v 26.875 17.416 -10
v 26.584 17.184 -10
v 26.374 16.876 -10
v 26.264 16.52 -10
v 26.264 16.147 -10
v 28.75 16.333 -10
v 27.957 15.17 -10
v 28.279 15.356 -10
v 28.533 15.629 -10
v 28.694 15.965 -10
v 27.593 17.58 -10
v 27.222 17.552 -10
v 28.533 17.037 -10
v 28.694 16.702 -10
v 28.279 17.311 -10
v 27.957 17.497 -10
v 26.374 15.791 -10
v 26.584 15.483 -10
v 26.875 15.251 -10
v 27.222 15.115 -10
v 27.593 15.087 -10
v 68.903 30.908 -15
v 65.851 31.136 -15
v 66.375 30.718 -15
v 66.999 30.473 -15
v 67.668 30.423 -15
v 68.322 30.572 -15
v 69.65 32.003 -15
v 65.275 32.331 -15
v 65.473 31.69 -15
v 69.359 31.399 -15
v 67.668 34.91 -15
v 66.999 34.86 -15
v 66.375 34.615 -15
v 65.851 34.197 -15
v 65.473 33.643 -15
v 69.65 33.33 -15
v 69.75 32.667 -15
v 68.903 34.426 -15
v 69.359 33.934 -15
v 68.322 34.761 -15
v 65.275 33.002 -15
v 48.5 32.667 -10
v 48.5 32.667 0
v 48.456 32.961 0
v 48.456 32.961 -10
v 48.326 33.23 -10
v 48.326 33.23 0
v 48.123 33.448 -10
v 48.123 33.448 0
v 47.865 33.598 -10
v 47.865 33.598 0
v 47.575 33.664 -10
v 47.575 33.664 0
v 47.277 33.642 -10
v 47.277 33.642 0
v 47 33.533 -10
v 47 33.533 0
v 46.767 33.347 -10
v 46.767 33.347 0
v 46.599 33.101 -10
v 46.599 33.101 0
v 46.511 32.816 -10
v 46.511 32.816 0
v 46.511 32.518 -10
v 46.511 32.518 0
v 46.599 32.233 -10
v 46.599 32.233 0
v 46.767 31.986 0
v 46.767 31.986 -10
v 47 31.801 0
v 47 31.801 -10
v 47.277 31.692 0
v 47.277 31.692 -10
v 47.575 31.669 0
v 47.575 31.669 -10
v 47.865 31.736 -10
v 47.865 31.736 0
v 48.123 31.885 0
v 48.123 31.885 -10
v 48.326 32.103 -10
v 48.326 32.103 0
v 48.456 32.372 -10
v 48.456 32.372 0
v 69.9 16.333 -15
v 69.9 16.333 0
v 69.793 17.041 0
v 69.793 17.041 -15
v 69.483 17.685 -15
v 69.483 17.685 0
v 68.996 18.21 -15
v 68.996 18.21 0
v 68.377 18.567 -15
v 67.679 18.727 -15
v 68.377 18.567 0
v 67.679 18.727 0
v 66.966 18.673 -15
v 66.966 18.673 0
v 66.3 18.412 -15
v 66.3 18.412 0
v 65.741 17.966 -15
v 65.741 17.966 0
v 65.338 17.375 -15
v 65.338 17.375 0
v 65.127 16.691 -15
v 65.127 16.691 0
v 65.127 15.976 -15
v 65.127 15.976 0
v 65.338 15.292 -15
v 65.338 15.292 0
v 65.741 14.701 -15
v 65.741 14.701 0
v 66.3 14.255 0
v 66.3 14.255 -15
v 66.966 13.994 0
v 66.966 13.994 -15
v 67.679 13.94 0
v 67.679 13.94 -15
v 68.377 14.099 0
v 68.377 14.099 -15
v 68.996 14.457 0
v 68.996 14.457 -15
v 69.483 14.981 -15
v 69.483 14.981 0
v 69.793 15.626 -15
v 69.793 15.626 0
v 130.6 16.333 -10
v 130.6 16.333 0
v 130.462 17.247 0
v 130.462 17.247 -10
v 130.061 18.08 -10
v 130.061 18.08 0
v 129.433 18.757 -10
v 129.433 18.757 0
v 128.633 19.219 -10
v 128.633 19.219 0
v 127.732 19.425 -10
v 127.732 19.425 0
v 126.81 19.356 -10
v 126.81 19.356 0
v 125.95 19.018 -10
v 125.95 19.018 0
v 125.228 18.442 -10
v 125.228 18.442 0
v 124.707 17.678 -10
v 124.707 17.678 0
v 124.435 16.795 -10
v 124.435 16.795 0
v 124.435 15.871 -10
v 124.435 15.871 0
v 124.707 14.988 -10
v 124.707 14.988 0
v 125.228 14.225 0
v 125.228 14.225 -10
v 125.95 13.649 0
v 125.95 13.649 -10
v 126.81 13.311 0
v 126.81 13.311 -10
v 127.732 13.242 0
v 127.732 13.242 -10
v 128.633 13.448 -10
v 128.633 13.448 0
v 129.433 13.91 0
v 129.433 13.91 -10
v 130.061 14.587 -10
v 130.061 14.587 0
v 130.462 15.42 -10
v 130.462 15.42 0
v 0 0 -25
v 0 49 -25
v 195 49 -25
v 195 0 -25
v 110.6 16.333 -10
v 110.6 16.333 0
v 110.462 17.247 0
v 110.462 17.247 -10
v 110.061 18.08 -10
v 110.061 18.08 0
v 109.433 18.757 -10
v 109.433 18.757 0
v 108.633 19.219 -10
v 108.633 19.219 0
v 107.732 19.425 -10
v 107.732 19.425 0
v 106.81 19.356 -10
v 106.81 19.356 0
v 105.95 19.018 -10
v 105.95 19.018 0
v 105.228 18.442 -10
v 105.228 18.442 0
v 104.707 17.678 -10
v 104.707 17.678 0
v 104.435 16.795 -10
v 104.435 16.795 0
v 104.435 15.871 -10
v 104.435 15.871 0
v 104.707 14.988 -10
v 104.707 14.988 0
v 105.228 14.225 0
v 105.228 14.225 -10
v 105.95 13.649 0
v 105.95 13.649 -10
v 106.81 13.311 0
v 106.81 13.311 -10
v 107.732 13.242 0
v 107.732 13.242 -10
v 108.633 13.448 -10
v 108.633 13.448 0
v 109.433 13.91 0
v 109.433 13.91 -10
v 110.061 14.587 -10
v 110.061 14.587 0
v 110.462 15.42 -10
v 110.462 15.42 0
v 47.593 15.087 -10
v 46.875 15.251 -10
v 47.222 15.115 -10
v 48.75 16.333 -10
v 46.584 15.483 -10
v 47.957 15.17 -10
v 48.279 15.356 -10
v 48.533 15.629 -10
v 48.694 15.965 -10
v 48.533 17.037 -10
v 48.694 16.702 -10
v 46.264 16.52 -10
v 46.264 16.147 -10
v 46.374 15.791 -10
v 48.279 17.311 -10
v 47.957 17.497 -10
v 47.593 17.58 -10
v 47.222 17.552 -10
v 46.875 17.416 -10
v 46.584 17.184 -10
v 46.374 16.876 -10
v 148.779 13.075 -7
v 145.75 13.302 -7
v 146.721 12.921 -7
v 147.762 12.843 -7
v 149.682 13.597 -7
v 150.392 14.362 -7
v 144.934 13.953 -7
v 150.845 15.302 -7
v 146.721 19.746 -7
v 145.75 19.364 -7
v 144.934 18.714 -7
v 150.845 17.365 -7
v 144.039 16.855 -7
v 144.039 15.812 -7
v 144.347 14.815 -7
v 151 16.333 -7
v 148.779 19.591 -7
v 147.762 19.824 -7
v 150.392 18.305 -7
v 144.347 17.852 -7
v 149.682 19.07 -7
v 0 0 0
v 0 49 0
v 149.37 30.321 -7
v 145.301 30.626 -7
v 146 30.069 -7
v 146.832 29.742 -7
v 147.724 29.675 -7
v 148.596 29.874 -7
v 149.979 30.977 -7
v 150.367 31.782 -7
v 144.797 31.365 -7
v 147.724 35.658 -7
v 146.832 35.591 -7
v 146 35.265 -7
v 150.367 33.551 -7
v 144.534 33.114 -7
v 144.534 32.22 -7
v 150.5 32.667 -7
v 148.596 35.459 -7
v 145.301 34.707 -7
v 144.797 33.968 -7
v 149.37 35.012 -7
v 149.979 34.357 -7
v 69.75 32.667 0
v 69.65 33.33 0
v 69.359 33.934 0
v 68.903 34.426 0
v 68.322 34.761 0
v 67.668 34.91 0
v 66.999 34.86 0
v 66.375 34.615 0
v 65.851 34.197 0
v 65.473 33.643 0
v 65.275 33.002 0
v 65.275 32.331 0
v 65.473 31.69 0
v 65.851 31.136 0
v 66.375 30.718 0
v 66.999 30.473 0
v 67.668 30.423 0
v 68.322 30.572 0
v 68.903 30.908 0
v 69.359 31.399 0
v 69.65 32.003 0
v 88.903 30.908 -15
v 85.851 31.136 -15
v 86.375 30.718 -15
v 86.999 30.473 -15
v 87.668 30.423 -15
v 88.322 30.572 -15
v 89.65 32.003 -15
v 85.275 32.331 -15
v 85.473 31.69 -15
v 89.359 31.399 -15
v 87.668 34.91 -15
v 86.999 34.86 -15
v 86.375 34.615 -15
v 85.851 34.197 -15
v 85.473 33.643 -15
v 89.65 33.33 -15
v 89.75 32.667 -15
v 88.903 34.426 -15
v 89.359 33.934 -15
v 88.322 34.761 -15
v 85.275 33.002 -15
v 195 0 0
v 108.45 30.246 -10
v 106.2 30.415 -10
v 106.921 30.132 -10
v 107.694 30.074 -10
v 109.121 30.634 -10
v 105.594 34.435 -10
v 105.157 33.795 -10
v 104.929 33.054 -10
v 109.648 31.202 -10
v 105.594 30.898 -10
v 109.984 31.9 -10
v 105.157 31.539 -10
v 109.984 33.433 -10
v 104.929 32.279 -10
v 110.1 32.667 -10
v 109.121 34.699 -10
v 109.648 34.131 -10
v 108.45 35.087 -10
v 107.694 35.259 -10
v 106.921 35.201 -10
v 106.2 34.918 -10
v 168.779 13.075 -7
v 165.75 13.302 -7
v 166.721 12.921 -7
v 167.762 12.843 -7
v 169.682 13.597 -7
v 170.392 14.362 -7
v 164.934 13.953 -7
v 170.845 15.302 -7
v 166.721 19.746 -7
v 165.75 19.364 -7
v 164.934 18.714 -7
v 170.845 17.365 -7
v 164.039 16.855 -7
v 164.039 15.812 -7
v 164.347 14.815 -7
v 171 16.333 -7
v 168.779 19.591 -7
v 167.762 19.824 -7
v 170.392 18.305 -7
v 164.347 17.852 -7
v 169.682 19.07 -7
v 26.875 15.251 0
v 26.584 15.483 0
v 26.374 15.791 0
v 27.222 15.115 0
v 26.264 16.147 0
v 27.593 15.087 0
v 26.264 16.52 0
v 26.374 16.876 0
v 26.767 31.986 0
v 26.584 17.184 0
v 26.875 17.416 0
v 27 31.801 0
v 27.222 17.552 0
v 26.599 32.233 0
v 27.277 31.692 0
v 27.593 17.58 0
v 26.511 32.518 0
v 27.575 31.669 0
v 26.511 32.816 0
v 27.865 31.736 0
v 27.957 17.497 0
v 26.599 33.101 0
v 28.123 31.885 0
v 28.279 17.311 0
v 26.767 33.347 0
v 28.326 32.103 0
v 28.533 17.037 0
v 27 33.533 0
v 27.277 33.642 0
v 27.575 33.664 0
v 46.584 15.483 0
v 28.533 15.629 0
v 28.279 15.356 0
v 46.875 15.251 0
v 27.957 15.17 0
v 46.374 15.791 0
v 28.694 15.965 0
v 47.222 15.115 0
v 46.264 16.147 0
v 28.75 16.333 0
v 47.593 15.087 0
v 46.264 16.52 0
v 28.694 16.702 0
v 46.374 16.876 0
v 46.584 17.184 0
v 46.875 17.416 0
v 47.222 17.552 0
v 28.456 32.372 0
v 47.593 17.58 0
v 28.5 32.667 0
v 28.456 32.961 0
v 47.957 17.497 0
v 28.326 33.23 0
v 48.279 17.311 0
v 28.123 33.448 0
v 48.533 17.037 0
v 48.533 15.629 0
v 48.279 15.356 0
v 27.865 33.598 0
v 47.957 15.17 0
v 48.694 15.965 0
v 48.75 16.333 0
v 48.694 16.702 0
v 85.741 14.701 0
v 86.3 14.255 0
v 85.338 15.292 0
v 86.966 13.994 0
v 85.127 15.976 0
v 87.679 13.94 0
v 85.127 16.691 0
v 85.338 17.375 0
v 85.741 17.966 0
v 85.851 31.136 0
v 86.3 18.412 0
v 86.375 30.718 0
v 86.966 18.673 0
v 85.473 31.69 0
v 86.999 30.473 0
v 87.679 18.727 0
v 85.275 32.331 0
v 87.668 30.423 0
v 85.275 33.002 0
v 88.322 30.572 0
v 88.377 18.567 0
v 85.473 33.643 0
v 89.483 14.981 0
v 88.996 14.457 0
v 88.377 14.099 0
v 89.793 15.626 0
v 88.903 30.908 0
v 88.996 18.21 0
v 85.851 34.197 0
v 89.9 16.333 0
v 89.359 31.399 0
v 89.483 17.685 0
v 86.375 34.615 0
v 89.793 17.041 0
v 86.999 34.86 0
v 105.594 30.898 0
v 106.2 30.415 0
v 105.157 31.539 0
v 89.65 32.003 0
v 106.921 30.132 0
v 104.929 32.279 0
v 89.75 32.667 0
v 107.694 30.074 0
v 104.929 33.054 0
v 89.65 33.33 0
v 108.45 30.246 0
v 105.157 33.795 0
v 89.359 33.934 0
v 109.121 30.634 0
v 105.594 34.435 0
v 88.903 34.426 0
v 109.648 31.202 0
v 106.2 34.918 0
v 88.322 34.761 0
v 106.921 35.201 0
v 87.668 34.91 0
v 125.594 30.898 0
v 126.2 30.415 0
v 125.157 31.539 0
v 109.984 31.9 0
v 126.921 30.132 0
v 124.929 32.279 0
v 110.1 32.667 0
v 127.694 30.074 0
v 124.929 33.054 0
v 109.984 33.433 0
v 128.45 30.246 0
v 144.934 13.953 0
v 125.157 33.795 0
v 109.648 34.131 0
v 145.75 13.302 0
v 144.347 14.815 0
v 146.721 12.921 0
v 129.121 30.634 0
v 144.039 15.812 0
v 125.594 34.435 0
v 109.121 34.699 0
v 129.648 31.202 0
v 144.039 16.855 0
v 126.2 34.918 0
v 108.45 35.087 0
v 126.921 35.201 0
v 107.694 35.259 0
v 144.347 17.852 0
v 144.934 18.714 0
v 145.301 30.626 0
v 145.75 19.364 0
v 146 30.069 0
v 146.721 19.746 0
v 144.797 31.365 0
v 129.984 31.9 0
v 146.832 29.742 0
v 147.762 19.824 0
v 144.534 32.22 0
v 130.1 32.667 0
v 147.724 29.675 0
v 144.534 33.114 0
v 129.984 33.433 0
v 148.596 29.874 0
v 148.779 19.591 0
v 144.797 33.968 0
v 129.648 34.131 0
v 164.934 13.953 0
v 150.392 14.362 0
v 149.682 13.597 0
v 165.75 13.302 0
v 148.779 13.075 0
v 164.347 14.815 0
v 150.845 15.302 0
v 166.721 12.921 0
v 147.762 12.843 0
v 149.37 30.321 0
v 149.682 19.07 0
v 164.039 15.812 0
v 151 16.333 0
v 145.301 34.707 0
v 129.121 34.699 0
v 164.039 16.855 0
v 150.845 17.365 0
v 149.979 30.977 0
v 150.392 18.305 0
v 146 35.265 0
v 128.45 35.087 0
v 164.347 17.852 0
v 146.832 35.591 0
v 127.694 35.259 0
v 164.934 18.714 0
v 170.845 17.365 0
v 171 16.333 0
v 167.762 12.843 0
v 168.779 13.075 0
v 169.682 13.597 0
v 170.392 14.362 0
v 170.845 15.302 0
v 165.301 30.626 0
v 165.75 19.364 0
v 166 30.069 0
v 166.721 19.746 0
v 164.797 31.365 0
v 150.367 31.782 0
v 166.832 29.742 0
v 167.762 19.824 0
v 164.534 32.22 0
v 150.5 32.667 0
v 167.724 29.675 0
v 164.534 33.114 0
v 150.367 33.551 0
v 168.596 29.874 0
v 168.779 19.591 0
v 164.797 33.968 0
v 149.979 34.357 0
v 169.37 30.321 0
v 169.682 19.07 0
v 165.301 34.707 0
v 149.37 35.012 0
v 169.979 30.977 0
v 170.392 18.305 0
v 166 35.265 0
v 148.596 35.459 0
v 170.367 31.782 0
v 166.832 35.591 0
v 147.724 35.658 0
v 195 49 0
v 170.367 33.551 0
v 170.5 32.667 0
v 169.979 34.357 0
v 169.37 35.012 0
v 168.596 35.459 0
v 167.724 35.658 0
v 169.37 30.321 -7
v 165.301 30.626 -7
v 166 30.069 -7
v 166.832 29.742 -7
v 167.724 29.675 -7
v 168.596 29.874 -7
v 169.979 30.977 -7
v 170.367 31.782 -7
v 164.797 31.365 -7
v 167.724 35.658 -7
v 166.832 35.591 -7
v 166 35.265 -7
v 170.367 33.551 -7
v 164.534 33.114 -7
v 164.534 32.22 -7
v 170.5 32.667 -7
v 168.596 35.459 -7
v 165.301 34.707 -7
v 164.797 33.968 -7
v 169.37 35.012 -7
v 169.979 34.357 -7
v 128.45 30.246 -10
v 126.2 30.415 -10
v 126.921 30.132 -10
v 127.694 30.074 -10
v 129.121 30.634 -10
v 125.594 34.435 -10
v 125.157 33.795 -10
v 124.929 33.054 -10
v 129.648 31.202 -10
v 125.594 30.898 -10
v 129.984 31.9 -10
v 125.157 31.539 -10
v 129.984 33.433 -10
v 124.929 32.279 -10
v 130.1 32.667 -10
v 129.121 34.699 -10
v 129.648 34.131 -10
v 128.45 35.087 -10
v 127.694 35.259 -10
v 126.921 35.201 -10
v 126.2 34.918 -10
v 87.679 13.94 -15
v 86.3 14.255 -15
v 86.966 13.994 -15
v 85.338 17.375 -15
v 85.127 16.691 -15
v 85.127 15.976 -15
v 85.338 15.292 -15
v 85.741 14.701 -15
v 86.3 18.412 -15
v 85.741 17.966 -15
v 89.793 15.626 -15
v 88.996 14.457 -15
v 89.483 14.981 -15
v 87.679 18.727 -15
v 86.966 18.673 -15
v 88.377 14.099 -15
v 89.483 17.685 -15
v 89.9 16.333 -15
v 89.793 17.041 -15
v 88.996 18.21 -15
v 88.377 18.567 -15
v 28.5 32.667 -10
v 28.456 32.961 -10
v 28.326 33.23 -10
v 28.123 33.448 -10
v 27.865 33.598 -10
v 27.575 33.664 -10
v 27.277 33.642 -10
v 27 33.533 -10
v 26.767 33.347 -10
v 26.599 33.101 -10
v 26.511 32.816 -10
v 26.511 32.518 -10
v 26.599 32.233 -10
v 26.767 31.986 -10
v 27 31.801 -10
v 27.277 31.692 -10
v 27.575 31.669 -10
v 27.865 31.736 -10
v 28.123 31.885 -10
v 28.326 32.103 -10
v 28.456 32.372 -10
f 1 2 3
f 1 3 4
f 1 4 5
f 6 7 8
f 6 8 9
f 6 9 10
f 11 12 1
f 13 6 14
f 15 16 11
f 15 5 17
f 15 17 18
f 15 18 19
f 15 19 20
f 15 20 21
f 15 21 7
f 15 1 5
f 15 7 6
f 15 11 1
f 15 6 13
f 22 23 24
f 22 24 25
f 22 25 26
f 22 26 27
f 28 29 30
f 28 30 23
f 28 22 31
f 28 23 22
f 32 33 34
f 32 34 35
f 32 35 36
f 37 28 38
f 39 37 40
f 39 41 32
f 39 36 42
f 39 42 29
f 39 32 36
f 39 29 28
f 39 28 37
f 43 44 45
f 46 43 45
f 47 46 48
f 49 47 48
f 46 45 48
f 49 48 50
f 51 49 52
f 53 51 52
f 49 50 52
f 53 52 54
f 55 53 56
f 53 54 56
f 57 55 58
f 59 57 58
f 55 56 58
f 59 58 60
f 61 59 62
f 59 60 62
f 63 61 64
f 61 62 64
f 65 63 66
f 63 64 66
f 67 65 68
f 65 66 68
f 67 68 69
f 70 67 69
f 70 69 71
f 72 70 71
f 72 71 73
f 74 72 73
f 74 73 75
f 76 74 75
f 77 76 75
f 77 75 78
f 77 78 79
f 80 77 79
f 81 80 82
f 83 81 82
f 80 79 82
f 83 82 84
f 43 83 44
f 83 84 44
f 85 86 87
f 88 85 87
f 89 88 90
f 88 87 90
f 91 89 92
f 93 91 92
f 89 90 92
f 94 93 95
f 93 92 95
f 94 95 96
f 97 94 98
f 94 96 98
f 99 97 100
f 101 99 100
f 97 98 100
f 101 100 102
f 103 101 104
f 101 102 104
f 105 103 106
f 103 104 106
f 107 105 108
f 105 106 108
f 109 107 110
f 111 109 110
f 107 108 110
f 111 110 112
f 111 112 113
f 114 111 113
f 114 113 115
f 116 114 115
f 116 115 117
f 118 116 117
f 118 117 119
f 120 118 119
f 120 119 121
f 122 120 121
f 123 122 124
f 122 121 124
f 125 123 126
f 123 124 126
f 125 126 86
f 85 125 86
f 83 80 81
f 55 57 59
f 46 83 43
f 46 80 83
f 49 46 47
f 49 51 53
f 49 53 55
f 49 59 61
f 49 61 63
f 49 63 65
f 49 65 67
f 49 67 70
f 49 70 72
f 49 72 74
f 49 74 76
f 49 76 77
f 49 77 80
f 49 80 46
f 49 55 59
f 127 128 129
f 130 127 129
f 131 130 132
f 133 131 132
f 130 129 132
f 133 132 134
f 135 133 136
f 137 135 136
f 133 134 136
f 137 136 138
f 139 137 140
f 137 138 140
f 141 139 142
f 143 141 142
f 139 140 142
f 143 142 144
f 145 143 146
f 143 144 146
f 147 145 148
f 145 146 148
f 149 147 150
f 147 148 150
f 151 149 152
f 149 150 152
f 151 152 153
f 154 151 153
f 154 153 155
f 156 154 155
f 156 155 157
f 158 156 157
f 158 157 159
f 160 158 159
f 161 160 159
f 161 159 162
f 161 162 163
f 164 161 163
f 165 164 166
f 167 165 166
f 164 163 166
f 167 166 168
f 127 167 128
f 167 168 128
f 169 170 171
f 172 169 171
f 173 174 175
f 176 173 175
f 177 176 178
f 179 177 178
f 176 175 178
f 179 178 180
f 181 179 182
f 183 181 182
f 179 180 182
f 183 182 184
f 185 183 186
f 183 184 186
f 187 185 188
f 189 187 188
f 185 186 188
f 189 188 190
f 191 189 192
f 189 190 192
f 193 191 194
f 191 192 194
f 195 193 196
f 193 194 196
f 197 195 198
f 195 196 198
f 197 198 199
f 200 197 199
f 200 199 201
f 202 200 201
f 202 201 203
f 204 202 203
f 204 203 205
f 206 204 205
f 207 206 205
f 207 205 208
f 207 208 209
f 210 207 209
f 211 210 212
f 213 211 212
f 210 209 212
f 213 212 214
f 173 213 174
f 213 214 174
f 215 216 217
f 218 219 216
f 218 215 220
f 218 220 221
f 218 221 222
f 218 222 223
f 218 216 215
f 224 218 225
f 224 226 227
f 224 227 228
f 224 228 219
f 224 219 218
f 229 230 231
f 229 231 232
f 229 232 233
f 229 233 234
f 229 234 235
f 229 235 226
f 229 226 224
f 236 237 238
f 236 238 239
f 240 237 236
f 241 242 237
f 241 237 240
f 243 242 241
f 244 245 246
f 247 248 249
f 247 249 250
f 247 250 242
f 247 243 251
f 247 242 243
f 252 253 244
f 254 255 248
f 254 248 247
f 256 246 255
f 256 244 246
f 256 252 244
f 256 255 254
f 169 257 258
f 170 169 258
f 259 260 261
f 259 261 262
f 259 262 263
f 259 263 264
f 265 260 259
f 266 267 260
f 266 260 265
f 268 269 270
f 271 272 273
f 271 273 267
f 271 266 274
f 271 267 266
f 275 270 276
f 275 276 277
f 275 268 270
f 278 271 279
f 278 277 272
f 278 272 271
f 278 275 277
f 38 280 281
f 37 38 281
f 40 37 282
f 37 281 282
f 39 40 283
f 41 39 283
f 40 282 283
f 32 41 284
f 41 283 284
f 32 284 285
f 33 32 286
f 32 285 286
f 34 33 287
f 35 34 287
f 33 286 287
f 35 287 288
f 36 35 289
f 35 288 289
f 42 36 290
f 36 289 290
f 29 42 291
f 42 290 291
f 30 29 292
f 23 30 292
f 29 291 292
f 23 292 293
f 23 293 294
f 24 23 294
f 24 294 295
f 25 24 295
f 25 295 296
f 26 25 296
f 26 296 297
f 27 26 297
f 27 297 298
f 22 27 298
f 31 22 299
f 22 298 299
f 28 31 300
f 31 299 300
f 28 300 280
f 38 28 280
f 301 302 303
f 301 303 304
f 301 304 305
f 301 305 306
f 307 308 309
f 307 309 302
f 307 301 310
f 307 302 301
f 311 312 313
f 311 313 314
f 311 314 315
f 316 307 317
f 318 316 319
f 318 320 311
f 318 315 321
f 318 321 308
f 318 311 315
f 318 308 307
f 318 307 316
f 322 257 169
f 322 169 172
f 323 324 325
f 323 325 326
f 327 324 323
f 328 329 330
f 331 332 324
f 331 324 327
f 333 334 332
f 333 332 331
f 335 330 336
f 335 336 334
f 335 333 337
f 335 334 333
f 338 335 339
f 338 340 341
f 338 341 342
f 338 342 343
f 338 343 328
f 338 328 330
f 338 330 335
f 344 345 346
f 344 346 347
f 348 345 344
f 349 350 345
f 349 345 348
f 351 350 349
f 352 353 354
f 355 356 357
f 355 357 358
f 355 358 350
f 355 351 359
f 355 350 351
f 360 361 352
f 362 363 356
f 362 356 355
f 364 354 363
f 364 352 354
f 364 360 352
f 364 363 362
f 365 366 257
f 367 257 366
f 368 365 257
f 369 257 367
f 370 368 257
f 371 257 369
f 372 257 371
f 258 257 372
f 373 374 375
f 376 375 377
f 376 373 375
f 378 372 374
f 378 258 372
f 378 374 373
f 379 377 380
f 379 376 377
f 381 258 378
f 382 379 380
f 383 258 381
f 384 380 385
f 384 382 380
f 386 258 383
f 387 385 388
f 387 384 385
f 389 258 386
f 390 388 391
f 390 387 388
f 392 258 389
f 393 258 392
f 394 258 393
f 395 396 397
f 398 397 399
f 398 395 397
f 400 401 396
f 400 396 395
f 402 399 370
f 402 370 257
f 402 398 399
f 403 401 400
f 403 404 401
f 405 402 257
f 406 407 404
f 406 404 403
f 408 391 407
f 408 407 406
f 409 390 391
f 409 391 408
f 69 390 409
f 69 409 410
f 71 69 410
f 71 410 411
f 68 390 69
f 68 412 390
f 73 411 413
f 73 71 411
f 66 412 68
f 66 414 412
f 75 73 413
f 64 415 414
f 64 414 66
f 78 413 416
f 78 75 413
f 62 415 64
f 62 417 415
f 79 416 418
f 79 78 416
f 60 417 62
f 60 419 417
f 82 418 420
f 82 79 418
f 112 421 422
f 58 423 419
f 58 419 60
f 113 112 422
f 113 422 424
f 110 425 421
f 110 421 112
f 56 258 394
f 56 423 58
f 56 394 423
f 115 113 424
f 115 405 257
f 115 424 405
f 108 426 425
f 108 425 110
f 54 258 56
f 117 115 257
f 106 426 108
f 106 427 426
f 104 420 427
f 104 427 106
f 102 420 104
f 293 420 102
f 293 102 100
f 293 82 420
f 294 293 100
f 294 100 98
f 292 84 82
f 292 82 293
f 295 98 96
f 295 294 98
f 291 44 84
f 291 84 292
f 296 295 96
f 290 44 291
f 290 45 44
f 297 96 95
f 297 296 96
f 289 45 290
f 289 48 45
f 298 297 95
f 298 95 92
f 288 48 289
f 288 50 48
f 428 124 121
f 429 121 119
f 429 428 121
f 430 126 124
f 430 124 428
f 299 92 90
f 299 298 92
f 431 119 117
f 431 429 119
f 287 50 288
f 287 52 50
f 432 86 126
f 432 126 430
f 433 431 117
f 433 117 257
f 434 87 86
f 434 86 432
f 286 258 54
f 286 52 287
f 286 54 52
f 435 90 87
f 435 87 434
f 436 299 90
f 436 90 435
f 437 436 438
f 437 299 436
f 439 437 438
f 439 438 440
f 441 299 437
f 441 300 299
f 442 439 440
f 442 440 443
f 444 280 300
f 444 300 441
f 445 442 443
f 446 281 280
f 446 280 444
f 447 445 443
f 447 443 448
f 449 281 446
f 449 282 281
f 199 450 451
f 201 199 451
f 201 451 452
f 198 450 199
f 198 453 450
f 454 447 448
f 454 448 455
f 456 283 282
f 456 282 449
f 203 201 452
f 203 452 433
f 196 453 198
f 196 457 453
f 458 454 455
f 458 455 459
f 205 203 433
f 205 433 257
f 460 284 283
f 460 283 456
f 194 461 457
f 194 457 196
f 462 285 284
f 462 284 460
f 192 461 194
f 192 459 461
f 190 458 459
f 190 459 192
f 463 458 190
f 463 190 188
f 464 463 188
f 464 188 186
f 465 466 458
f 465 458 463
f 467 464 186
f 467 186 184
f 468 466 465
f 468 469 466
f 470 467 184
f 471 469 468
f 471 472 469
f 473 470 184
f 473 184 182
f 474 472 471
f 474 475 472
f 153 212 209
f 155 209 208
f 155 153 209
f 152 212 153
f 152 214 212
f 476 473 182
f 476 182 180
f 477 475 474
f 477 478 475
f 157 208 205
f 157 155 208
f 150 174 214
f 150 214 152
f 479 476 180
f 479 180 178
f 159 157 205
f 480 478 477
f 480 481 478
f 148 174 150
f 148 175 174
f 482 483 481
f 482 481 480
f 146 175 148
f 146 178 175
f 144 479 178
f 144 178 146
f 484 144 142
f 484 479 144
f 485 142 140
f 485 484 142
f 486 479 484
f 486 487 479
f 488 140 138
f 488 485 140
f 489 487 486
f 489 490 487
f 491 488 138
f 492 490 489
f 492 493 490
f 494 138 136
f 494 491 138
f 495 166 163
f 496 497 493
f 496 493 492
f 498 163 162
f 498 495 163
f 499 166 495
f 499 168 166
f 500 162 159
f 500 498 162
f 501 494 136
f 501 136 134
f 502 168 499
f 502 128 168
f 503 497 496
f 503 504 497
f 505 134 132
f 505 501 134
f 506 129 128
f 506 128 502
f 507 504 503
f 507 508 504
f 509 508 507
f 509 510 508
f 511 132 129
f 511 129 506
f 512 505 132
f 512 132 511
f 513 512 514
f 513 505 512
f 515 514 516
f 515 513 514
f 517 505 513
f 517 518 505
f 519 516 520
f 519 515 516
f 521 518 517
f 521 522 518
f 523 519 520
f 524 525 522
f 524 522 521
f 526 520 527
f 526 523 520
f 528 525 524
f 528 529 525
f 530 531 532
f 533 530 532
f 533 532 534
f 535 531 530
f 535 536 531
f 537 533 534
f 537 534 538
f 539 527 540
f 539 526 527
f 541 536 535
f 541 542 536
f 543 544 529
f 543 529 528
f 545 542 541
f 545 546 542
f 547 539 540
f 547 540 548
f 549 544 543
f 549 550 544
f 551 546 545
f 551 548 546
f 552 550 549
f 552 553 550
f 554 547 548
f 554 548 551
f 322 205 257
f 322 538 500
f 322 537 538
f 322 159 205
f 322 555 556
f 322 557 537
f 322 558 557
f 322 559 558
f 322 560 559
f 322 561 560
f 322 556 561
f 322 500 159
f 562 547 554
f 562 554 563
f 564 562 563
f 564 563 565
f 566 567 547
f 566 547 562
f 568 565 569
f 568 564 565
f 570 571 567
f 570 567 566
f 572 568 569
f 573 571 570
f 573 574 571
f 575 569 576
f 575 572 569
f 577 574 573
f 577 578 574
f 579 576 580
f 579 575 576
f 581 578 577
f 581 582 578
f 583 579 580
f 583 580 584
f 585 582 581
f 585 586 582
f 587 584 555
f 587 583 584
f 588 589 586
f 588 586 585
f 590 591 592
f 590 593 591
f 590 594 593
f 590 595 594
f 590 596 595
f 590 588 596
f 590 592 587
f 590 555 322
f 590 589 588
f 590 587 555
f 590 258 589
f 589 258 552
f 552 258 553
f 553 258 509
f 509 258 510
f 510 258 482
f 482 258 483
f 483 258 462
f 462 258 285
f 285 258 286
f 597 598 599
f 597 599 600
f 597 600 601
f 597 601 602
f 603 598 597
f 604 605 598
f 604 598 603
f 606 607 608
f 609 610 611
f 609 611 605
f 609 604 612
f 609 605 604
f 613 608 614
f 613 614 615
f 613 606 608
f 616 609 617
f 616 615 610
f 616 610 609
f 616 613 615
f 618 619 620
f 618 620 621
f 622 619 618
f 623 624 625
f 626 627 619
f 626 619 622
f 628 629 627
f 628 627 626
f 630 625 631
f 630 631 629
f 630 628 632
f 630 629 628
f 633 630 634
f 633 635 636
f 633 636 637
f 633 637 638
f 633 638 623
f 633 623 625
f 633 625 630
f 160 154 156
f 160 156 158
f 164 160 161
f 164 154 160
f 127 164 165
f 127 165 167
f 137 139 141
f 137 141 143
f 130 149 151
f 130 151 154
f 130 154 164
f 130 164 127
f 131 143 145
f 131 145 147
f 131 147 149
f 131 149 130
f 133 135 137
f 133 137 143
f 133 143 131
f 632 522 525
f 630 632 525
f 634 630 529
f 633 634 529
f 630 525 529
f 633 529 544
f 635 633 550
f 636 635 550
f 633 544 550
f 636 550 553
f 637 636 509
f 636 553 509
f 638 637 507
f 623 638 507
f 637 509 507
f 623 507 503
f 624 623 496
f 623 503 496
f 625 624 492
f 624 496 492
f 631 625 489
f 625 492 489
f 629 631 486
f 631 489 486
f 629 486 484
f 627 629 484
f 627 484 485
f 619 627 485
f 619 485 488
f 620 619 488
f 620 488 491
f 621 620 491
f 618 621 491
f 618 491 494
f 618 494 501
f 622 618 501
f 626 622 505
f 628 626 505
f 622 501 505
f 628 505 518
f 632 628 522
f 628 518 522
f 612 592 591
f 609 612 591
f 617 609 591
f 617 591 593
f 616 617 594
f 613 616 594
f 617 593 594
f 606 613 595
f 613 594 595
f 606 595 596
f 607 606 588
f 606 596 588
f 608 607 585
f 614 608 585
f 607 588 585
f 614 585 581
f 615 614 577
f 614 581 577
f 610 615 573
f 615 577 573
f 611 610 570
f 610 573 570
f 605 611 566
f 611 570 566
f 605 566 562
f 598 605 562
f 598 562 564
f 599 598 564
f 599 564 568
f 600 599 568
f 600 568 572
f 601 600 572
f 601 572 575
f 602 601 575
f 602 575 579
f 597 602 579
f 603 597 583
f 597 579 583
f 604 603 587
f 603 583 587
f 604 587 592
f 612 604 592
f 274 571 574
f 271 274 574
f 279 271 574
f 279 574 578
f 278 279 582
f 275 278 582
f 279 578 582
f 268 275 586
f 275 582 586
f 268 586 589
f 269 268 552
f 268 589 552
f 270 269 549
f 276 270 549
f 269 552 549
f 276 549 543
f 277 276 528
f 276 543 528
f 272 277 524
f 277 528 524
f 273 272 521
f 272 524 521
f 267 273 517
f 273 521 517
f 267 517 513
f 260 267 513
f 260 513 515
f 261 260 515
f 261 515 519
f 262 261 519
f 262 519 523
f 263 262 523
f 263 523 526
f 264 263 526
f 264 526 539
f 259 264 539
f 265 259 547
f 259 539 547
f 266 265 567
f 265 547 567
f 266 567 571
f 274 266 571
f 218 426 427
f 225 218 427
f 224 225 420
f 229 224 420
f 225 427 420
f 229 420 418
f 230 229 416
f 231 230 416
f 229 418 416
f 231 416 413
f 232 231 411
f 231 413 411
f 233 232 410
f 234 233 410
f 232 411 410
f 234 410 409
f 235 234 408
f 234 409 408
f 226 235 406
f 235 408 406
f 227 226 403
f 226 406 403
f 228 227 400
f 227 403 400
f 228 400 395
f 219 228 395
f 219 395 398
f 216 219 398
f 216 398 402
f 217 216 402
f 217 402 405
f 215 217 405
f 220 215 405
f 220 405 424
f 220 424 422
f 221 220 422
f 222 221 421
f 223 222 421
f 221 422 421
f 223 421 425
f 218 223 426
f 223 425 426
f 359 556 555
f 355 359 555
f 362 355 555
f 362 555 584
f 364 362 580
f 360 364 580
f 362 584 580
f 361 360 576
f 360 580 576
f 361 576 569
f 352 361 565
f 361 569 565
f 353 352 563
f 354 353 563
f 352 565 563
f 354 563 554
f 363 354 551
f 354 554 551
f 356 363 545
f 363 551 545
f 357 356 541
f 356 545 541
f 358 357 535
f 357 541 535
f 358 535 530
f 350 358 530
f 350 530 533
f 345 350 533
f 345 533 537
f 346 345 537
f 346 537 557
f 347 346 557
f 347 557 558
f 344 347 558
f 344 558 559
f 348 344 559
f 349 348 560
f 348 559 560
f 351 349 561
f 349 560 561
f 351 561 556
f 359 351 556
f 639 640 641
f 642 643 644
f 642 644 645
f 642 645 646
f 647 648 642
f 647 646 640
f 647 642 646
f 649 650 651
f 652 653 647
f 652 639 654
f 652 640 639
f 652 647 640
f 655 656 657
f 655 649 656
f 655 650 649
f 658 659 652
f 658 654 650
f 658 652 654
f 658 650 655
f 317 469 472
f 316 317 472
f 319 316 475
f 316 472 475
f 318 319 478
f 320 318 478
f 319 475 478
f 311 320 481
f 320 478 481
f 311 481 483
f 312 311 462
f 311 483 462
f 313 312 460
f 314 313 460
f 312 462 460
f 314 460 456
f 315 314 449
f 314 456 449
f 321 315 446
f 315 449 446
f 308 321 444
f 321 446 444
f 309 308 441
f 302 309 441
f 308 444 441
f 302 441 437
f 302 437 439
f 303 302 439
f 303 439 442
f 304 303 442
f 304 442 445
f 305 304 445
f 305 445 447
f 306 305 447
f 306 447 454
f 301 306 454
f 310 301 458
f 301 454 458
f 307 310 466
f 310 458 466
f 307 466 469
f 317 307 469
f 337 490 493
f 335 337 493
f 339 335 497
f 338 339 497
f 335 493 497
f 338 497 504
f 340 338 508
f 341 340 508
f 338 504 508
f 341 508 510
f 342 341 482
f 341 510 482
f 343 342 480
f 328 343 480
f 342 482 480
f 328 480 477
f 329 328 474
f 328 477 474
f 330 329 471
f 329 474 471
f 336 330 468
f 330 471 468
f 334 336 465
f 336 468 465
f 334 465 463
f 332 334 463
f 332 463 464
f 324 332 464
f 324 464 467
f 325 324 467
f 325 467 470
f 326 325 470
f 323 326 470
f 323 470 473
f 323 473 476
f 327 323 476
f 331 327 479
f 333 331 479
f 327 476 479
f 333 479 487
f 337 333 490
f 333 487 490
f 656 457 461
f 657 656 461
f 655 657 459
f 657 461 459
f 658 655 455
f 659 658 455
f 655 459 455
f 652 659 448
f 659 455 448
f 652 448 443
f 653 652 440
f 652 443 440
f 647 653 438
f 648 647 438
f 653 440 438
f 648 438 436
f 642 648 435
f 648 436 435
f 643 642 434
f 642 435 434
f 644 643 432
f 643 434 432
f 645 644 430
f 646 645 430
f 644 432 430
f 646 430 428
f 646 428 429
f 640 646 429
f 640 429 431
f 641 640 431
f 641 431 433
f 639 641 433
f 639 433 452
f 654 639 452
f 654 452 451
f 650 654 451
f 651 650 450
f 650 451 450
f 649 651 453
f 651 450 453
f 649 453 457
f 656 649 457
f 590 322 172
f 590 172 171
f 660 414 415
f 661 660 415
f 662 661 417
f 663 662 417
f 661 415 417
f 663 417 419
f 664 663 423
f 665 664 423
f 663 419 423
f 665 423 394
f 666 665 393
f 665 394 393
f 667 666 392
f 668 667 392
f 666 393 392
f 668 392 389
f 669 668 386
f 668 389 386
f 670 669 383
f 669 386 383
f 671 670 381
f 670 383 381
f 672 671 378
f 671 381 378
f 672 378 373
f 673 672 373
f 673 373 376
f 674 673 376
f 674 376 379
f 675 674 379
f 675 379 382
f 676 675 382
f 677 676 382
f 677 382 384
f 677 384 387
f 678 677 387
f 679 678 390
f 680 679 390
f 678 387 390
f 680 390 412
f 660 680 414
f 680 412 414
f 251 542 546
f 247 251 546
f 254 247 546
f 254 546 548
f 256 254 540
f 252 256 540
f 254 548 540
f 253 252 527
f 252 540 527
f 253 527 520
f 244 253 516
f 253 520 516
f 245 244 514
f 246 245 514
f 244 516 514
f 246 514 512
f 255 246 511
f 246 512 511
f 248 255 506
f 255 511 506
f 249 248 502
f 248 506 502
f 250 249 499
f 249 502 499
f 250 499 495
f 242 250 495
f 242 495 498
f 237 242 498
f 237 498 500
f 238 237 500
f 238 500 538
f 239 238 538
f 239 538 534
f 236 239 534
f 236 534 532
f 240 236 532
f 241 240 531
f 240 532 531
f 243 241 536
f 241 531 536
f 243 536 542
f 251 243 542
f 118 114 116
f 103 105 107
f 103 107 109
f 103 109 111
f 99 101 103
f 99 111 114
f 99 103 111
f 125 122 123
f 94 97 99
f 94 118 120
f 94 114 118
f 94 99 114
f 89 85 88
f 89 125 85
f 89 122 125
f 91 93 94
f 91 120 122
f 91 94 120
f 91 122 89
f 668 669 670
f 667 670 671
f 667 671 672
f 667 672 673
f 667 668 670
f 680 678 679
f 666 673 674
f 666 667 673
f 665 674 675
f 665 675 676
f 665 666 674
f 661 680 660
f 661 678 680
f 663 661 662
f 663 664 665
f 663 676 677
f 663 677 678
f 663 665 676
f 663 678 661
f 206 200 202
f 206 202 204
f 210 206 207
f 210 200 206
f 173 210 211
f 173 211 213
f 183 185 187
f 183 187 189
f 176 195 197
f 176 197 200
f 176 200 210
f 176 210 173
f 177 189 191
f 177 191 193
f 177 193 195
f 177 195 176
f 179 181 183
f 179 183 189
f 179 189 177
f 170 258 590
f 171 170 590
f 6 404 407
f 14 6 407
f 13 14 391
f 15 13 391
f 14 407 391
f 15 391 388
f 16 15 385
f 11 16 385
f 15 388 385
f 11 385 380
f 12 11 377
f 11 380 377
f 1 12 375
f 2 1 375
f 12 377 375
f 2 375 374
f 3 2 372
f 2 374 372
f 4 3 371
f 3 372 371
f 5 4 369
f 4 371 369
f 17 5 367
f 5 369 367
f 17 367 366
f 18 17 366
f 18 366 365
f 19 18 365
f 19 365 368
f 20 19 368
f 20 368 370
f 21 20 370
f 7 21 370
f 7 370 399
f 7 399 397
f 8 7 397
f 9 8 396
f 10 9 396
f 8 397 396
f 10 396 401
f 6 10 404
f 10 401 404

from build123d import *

# Parameters (mm, degrees)
F0_W     = 195
F0_H     = 49
F0_R     = 1.25
F0_R_2   = 2.4
F0_R_3   = 3.1
F0_R_4   = 3.5
F0_R_5   = 1
F0_R_6   = 2.25
F0_R_7   = 2.6
F0_R_8   = 3
F1_DEPTH = 25
F2_DEPTH = 10
F3_DEPTH = 15
F4_DEPTH = 7


with BuildPart() as f1:
    # F0 (on Top) → F1 (new body)
    with BuildSketch(Plane.XY):
        with Locations((97.5, 24.5)):
            Rectangle(F0_W, F0_H)
        with Locations((27.5, 16.333333)):
            Circle(F0_R, mode=Mode.SUBTRACT)
        with Locations((47.5, 16.333333)):
            Circle(F0_R, mode=Mode.SUBTRACT)
        with Locations((67.5, 16.333333)):
            Circle(F0_R_2, mode=Mode.SUBTRACT)
        with Locations((87.5, 16.333333)):
            Circle(F0_R_2, mode=Mode.SUBTRACT)
        with Locations((107.5, 16.333333)):
            Circle(F0_R_3, mode=Mode.SUBTRACT)
        with Locations((127.5, 16.333333)):
            Circle(F0_R_3, mode=Mode.SUBTRACT)
        with Locations((147.5, 16.333333)):
            Circle(F0_R_4, mode=Mode.SUBTRACT)
        with Locations((167.5, 16.333333)):
            Circle(F0_R_4, mode=Mode.SUBTRACT)
        with Locations((27.5, 32.666667)):
            Circle(F0_R_5, mode=Mode.SUBTRACT)
        with Locations((47.5, 32.666667)):
            Circle(F0_R_5, mode=Mode.SUBTRACT)
        with Locations((67.5, 32.666667)):
            Circle(F0_R_6, mode=Mode.SUBTRACT)
        with Locations((87.5, 32.666667)):
            Circle(F0_R_6, mode=Mode.SUBTRACT)
        with Locations((107.5, 32.666667)):
            Circle(F0_R_7, mode=Mode.SUBTRACT)
        with Locations((127.5, 32.666667)):
            Circle(F0_R_7, mode=Mode.SUBTRACT)
        with Locations((147.5, 32.666667)):
            Circle(F0_R_8, mode=Mode.SUBTRACT)
        with Locations((167.5, 32.666667)):
            Circle(F0_R_8, mode=Mode.SUBTRACT)
        with Locations((27.5, 32.666667)):
            Circle(F0_R_5)
        with Locations((27.5, 16.333333)):
            Circle(F0_R)
        with Locations((47.5, 16.333333)):
            Circle(F0_R)
        with Locations((47.5, 32.666667)):
            Circle(F0_R_5)
        with Locations((67.5, 32.666667)):
            Circle(F0_R_6)
        with Locations((67.5, 16.333333)):
            Circle(F0_R_2)
        with Locations((87.5, 32.666667)):
            Circle(F0_R_6)
        with Locations((87.5, 16.333333)):
            Circle(F0_R_2)
        with Locations((107.5, 16.333333)):
            Circle(F0_R_3)
        with Locations((107.5, 32.666667)):
            Circle(F0_R_7)
        with Locations((147.5, 32.666667)):
            Circle(F0_R_8)
        with Locations((127.5, 32.666667)):
            Circle(F0_R_7)
        with Locations((127.5, 16.333333)):
            Circle(F0_R_3)
        with Locations((147.5, 16.333333)):
            Circle(F0_R_4)
        with Locations((167.5, 32.666667)):
            Circle(F0_R_8)
        with Locations((167.5, 16.333333)):
            Circle(F0_R_4)
    extrude(amount=-F1_DEPTH)

    # F0 (on Top) → F2 (cut)
    with BuildSketch(Plane.XY):
        with Locations((27.5, 32.666667)):
            Circle(F0_R_5)
        with Locations((47.5, 32.666667)):
            Circle(F0_R_5)
        with Locations((27.5, 16.333333)):
            Circle(F0_R)
        with Locations((47.5, 16.333333)):
            Circle(F0_R)
        with Locations((107.5, 32.666667)):
            Circle(F0_R_7)
        with Locations((107.5, 16.333333)):
            Circle(F0_R_3)
        with Locations((127.5, 32.666667)):
            Circle(F0_R_7)
        with Locations((127.5, 16.333333)):
            Circle(F0_R_3)
    extrude(amount=-F2_DEPTH, mode=Mode.SUBTRACT)

    # F0 (on Top) → F3 (cut)
    with BuildSketch(Plane.XY):
        with Locations((67.5, 32.666667)):
            Circle(F0_R_6)
        with Locations((87.5, 32.666667)):
            Circle(F0_R_6)
        with Locations((87.5, 16.333333)):
            Circle(F0_R_2)
        with Locations((67.5, 16.333333)):
            Circle(F0_R_2)
    extrude(amount=-F3_DEPTH, mode=Mode.SUBTRACT)

    # F0 (on Top) → F4 (cut)
    with BuildSketch(Plane.XY):
        with Locations((147.5, 32.666667)):
            Circle(F0_R_8)
        with Locations((147.5, 16.333333)):
            Circle(F0_R_4)
        with Locations((167.5, 16.333333)):
            Circle(F0_R_4)
        with Locations((167.5, 32.666667)):
            Circle(F0_R_8)
    extrude(amount=-F4_DEPTH, mode=Mode.SUBTRACT)


solid = f1.part
